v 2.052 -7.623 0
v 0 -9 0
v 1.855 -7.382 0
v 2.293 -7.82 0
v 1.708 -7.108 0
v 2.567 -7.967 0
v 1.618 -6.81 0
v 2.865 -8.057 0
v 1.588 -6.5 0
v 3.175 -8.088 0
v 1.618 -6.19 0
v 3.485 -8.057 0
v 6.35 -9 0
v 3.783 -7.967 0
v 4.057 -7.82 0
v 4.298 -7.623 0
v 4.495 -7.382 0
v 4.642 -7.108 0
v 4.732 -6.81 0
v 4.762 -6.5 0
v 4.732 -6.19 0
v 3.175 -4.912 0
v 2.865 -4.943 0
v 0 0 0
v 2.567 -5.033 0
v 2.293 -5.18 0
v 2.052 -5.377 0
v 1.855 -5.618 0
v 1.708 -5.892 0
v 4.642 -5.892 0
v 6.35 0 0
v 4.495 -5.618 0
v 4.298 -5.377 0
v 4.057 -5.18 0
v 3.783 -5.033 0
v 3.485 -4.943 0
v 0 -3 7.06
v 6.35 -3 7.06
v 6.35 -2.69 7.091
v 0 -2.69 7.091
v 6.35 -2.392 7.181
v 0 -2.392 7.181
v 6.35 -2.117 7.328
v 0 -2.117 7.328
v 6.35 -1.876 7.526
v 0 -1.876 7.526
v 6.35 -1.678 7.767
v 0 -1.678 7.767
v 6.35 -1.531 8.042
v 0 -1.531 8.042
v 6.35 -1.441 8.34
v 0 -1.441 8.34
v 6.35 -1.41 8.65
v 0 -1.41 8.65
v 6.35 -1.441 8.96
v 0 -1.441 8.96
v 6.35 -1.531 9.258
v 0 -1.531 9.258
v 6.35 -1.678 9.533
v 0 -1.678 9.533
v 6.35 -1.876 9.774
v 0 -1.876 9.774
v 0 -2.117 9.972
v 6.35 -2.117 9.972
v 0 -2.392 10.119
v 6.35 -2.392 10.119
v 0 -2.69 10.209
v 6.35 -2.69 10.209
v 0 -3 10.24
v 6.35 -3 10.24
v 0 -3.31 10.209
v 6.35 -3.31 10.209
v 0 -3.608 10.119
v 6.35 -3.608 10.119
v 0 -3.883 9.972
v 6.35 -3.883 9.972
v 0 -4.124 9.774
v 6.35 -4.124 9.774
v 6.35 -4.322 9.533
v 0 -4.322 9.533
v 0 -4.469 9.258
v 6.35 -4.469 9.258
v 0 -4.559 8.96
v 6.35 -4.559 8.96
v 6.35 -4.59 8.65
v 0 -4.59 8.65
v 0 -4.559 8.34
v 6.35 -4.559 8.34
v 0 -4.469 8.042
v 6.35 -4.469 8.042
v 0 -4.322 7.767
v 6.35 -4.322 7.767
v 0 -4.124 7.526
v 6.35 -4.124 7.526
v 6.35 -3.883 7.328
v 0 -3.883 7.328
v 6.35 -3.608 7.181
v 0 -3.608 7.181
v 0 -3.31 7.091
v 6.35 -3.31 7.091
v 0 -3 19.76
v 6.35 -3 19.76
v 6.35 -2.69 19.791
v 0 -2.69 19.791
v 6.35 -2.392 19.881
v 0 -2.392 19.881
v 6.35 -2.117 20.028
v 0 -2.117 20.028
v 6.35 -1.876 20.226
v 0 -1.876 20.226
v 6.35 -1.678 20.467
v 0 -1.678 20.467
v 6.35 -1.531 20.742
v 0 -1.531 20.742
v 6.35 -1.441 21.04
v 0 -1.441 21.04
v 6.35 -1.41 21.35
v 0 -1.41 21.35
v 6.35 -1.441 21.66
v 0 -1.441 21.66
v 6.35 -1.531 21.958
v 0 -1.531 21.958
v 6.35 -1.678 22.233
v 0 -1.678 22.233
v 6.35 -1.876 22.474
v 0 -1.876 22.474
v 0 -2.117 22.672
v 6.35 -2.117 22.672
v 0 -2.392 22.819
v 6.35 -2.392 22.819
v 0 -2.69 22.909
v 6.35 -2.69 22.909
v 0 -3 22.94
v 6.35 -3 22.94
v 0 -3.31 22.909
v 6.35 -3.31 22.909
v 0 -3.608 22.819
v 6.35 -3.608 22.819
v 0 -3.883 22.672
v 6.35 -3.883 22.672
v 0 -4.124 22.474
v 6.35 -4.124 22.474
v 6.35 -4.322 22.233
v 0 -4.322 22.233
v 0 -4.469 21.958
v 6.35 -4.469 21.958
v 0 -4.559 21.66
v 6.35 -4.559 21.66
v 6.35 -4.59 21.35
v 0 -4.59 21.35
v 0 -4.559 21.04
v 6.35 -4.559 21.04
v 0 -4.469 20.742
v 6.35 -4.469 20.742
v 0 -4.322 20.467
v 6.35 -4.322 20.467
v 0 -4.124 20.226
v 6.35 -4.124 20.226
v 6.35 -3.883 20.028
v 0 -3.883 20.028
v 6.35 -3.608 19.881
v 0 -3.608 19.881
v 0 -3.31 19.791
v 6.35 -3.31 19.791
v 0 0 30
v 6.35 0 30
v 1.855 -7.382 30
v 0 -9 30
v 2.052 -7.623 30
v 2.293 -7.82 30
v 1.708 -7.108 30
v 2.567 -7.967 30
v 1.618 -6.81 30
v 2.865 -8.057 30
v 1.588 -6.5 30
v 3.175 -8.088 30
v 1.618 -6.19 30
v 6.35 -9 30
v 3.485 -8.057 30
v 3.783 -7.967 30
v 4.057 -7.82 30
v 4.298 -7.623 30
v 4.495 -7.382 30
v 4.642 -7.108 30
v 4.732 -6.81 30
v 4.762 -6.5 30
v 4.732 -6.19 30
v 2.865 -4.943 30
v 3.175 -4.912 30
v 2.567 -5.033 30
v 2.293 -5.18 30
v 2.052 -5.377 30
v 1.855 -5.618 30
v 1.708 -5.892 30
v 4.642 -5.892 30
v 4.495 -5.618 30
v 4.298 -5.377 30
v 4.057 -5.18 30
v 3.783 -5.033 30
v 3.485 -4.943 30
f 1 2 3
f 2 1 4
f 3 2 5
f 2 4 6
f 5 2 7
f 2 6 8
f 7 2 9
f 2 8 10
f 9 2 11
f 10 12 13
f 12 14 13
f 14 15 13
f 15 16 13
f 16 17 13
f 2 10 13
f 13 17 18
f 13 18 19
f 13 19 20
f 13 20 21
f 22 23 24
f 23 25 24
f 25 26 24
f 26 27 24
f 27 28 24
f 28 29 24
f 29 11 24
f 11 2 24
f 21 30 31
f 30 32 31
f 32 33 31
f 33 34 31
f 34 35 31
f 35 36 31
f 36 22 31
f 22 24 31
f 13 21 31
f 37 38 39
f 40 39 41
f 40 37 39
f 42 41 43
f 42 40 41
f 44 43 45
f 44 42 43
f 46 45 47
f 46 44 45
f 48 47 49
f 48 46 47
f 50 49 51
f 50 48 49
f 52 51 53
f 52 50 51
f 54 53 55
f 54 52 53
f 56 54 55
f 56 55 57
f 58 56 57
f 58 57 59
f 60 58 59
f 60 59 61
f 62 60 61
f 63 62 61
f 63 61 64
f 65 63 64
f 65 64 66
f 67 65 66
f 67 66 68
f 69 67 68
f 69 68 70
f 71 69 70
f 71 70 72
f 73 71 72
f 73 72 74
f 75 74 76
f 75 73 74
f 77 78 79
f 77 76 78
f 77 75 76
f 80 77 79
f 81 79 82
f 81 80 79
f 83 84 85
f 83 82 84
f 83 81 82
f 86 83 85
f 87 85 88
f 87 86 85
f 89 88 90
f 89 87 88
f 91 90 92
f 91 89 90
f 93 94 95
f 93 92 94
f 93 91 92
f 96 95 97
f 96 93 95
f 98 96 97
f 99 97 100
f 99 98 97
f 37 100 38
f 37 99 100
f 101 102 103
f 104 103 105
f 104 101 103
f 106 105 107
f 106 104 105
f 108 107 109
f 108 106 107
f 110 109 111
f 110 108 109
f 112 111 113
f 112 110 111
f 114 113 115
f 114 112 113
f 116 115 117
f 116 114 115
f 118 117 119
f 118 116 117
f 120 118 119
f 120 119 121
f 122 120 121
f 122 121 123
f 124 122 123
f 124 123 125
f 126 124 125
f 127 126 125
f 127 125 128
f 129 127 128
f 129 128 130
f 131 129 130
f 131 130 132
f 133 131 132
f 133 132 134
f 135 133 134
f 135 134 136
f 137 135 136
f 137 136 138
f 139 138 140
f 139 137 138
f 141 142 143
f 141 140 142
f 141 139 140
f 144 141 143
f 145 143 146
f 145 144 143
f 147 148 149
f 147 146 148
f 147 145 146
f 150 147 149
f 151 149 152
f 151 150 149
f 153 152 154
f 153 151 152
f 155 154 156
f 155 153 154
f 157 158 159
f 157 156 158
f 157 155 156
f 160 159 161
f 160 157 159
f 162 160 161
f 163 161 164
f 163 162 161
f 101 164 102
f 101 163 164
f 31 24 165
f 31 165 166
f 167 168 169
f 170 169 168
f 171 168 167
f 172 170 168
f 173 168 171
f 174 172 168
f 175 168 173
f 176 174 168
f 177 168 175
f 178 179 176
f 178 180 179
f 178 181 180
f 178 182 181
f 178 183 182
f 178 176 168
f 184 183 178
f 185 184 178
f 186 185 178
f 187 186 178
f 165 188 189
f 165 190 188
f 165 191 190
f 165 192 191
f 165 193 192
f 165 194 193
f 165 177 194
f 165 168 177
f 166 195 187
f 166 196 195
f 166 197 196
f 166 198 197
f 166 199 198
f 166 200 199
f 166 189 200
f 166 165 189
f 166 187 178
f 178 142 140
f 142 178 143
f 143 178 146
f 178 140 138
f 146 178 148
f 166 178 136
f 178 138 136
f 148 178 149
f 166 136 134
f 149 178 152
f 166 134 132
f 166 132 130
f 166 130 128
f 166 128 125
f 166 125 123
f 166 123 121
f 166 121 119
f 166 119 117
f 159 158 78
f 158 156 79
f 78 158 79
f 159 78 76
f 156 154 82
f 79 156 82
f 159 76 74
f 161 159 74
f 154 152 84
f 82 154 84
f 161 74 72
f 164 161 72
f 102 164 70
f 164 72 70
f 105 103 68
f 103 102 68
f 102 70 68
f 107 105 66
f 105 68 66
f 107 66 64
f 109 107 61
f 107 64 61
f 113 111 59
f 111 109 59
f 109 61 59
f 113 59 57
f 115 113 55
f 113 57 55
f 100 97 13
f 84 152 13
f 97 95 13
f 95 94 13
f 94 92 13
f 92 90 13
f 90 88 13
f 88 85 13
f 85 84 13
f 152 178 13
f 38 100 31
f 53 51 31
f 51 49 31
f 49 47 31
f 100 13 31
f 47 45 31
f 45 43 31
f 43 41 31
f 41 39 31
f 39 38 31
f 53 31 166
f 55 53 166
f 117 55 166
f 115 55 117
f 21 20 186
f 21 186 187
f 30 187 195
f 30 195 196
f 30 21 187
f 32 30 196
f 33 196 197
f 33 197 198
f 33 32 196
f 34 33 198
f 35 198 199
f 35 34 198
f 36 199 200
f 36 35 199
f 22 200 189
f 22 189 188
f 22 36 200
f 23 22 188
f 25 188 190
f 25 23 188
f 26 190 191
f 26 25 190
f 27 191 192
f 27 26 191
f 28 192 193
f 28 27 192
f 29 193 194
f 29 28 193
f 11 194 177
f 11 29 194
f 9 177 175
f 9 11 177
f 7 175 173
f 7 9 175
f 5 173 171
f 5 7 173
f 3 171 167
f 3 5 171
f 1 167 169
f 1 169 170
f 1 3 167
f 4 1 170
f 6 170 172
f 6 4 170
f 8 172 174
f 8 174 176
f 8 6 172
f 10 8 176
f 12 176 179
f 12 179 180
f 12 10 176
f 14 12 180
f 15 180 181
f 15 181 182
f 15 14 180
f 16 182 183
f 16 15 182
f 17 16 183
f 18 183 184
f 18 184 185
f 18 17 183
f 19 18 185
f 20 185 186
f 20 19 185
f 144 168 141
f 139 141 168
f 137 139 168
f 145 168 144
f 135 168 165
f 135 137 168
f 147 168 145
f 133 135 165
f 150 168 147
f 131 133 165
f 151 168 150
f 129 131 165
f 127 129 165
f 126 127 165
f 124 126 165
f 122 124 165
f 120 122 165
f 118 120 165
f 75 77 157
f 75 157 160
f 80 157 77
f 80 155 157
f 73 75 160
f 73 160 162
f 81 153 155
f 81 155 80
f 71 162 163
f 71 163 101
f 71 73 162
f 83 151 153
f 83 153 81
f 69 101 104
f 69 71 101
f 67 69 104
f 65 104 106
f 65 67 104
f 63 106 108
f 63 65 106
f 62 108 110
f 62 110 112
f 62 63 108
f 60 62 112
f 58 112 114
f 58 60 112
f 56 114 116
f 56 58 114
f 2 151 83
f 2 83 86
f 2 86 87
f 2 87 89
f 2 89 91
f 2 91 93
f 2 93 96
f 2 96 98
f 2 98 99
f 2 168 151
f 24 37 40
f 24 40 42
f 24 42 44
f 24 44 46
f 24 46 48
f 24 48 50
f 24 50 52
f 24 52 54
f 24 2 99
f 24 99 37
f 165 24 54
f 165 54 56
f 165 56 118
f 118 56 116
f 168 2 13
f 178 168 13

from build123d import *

# Parameters (mm, degrees)
SKETCH1_W           = 6.35
SKETCH1_H           = 9
SKETCH1_R           = 1.5875
BOSS_EXTRUDE1_DEPTH = 30
SKETCH2_R           = 1.59
CUT_EXTRUDE1_DEPTH  = 30


with BuildPart() as part:
    # Sketch1 → Boss-Extrude1 (new body)
    with BuildSketch(Plane.XY):
        with Locations((3.175, -4.5)):
            Rectangle(SKETCH1_W, SKETCH1_H)
        with Locations((3.175, -6.5)):
            Circle(SKETCH1_R, mode=Mode.SUBTRACT)
    extrude(amount=BOSS_EXTRUDE1_DEPTH)

    # Sketch2 → Cut-Extrude1 (cut)
    with BuildSketch(Plane(origin=(0, 0, 0), x_dir=(0, 0, -1), z_dir=(1, 0, 0))):
        with Locations((-21.35, -3)):
            Circle(SKETCH2_R)
        with Locations((-8.65, -3)):
            Circle(SKETCH2_R)
    extrude(amount=CUT_EXTRUDE1_DEPTH, mode=Mode.SUBTRACT)


solid = part.part
